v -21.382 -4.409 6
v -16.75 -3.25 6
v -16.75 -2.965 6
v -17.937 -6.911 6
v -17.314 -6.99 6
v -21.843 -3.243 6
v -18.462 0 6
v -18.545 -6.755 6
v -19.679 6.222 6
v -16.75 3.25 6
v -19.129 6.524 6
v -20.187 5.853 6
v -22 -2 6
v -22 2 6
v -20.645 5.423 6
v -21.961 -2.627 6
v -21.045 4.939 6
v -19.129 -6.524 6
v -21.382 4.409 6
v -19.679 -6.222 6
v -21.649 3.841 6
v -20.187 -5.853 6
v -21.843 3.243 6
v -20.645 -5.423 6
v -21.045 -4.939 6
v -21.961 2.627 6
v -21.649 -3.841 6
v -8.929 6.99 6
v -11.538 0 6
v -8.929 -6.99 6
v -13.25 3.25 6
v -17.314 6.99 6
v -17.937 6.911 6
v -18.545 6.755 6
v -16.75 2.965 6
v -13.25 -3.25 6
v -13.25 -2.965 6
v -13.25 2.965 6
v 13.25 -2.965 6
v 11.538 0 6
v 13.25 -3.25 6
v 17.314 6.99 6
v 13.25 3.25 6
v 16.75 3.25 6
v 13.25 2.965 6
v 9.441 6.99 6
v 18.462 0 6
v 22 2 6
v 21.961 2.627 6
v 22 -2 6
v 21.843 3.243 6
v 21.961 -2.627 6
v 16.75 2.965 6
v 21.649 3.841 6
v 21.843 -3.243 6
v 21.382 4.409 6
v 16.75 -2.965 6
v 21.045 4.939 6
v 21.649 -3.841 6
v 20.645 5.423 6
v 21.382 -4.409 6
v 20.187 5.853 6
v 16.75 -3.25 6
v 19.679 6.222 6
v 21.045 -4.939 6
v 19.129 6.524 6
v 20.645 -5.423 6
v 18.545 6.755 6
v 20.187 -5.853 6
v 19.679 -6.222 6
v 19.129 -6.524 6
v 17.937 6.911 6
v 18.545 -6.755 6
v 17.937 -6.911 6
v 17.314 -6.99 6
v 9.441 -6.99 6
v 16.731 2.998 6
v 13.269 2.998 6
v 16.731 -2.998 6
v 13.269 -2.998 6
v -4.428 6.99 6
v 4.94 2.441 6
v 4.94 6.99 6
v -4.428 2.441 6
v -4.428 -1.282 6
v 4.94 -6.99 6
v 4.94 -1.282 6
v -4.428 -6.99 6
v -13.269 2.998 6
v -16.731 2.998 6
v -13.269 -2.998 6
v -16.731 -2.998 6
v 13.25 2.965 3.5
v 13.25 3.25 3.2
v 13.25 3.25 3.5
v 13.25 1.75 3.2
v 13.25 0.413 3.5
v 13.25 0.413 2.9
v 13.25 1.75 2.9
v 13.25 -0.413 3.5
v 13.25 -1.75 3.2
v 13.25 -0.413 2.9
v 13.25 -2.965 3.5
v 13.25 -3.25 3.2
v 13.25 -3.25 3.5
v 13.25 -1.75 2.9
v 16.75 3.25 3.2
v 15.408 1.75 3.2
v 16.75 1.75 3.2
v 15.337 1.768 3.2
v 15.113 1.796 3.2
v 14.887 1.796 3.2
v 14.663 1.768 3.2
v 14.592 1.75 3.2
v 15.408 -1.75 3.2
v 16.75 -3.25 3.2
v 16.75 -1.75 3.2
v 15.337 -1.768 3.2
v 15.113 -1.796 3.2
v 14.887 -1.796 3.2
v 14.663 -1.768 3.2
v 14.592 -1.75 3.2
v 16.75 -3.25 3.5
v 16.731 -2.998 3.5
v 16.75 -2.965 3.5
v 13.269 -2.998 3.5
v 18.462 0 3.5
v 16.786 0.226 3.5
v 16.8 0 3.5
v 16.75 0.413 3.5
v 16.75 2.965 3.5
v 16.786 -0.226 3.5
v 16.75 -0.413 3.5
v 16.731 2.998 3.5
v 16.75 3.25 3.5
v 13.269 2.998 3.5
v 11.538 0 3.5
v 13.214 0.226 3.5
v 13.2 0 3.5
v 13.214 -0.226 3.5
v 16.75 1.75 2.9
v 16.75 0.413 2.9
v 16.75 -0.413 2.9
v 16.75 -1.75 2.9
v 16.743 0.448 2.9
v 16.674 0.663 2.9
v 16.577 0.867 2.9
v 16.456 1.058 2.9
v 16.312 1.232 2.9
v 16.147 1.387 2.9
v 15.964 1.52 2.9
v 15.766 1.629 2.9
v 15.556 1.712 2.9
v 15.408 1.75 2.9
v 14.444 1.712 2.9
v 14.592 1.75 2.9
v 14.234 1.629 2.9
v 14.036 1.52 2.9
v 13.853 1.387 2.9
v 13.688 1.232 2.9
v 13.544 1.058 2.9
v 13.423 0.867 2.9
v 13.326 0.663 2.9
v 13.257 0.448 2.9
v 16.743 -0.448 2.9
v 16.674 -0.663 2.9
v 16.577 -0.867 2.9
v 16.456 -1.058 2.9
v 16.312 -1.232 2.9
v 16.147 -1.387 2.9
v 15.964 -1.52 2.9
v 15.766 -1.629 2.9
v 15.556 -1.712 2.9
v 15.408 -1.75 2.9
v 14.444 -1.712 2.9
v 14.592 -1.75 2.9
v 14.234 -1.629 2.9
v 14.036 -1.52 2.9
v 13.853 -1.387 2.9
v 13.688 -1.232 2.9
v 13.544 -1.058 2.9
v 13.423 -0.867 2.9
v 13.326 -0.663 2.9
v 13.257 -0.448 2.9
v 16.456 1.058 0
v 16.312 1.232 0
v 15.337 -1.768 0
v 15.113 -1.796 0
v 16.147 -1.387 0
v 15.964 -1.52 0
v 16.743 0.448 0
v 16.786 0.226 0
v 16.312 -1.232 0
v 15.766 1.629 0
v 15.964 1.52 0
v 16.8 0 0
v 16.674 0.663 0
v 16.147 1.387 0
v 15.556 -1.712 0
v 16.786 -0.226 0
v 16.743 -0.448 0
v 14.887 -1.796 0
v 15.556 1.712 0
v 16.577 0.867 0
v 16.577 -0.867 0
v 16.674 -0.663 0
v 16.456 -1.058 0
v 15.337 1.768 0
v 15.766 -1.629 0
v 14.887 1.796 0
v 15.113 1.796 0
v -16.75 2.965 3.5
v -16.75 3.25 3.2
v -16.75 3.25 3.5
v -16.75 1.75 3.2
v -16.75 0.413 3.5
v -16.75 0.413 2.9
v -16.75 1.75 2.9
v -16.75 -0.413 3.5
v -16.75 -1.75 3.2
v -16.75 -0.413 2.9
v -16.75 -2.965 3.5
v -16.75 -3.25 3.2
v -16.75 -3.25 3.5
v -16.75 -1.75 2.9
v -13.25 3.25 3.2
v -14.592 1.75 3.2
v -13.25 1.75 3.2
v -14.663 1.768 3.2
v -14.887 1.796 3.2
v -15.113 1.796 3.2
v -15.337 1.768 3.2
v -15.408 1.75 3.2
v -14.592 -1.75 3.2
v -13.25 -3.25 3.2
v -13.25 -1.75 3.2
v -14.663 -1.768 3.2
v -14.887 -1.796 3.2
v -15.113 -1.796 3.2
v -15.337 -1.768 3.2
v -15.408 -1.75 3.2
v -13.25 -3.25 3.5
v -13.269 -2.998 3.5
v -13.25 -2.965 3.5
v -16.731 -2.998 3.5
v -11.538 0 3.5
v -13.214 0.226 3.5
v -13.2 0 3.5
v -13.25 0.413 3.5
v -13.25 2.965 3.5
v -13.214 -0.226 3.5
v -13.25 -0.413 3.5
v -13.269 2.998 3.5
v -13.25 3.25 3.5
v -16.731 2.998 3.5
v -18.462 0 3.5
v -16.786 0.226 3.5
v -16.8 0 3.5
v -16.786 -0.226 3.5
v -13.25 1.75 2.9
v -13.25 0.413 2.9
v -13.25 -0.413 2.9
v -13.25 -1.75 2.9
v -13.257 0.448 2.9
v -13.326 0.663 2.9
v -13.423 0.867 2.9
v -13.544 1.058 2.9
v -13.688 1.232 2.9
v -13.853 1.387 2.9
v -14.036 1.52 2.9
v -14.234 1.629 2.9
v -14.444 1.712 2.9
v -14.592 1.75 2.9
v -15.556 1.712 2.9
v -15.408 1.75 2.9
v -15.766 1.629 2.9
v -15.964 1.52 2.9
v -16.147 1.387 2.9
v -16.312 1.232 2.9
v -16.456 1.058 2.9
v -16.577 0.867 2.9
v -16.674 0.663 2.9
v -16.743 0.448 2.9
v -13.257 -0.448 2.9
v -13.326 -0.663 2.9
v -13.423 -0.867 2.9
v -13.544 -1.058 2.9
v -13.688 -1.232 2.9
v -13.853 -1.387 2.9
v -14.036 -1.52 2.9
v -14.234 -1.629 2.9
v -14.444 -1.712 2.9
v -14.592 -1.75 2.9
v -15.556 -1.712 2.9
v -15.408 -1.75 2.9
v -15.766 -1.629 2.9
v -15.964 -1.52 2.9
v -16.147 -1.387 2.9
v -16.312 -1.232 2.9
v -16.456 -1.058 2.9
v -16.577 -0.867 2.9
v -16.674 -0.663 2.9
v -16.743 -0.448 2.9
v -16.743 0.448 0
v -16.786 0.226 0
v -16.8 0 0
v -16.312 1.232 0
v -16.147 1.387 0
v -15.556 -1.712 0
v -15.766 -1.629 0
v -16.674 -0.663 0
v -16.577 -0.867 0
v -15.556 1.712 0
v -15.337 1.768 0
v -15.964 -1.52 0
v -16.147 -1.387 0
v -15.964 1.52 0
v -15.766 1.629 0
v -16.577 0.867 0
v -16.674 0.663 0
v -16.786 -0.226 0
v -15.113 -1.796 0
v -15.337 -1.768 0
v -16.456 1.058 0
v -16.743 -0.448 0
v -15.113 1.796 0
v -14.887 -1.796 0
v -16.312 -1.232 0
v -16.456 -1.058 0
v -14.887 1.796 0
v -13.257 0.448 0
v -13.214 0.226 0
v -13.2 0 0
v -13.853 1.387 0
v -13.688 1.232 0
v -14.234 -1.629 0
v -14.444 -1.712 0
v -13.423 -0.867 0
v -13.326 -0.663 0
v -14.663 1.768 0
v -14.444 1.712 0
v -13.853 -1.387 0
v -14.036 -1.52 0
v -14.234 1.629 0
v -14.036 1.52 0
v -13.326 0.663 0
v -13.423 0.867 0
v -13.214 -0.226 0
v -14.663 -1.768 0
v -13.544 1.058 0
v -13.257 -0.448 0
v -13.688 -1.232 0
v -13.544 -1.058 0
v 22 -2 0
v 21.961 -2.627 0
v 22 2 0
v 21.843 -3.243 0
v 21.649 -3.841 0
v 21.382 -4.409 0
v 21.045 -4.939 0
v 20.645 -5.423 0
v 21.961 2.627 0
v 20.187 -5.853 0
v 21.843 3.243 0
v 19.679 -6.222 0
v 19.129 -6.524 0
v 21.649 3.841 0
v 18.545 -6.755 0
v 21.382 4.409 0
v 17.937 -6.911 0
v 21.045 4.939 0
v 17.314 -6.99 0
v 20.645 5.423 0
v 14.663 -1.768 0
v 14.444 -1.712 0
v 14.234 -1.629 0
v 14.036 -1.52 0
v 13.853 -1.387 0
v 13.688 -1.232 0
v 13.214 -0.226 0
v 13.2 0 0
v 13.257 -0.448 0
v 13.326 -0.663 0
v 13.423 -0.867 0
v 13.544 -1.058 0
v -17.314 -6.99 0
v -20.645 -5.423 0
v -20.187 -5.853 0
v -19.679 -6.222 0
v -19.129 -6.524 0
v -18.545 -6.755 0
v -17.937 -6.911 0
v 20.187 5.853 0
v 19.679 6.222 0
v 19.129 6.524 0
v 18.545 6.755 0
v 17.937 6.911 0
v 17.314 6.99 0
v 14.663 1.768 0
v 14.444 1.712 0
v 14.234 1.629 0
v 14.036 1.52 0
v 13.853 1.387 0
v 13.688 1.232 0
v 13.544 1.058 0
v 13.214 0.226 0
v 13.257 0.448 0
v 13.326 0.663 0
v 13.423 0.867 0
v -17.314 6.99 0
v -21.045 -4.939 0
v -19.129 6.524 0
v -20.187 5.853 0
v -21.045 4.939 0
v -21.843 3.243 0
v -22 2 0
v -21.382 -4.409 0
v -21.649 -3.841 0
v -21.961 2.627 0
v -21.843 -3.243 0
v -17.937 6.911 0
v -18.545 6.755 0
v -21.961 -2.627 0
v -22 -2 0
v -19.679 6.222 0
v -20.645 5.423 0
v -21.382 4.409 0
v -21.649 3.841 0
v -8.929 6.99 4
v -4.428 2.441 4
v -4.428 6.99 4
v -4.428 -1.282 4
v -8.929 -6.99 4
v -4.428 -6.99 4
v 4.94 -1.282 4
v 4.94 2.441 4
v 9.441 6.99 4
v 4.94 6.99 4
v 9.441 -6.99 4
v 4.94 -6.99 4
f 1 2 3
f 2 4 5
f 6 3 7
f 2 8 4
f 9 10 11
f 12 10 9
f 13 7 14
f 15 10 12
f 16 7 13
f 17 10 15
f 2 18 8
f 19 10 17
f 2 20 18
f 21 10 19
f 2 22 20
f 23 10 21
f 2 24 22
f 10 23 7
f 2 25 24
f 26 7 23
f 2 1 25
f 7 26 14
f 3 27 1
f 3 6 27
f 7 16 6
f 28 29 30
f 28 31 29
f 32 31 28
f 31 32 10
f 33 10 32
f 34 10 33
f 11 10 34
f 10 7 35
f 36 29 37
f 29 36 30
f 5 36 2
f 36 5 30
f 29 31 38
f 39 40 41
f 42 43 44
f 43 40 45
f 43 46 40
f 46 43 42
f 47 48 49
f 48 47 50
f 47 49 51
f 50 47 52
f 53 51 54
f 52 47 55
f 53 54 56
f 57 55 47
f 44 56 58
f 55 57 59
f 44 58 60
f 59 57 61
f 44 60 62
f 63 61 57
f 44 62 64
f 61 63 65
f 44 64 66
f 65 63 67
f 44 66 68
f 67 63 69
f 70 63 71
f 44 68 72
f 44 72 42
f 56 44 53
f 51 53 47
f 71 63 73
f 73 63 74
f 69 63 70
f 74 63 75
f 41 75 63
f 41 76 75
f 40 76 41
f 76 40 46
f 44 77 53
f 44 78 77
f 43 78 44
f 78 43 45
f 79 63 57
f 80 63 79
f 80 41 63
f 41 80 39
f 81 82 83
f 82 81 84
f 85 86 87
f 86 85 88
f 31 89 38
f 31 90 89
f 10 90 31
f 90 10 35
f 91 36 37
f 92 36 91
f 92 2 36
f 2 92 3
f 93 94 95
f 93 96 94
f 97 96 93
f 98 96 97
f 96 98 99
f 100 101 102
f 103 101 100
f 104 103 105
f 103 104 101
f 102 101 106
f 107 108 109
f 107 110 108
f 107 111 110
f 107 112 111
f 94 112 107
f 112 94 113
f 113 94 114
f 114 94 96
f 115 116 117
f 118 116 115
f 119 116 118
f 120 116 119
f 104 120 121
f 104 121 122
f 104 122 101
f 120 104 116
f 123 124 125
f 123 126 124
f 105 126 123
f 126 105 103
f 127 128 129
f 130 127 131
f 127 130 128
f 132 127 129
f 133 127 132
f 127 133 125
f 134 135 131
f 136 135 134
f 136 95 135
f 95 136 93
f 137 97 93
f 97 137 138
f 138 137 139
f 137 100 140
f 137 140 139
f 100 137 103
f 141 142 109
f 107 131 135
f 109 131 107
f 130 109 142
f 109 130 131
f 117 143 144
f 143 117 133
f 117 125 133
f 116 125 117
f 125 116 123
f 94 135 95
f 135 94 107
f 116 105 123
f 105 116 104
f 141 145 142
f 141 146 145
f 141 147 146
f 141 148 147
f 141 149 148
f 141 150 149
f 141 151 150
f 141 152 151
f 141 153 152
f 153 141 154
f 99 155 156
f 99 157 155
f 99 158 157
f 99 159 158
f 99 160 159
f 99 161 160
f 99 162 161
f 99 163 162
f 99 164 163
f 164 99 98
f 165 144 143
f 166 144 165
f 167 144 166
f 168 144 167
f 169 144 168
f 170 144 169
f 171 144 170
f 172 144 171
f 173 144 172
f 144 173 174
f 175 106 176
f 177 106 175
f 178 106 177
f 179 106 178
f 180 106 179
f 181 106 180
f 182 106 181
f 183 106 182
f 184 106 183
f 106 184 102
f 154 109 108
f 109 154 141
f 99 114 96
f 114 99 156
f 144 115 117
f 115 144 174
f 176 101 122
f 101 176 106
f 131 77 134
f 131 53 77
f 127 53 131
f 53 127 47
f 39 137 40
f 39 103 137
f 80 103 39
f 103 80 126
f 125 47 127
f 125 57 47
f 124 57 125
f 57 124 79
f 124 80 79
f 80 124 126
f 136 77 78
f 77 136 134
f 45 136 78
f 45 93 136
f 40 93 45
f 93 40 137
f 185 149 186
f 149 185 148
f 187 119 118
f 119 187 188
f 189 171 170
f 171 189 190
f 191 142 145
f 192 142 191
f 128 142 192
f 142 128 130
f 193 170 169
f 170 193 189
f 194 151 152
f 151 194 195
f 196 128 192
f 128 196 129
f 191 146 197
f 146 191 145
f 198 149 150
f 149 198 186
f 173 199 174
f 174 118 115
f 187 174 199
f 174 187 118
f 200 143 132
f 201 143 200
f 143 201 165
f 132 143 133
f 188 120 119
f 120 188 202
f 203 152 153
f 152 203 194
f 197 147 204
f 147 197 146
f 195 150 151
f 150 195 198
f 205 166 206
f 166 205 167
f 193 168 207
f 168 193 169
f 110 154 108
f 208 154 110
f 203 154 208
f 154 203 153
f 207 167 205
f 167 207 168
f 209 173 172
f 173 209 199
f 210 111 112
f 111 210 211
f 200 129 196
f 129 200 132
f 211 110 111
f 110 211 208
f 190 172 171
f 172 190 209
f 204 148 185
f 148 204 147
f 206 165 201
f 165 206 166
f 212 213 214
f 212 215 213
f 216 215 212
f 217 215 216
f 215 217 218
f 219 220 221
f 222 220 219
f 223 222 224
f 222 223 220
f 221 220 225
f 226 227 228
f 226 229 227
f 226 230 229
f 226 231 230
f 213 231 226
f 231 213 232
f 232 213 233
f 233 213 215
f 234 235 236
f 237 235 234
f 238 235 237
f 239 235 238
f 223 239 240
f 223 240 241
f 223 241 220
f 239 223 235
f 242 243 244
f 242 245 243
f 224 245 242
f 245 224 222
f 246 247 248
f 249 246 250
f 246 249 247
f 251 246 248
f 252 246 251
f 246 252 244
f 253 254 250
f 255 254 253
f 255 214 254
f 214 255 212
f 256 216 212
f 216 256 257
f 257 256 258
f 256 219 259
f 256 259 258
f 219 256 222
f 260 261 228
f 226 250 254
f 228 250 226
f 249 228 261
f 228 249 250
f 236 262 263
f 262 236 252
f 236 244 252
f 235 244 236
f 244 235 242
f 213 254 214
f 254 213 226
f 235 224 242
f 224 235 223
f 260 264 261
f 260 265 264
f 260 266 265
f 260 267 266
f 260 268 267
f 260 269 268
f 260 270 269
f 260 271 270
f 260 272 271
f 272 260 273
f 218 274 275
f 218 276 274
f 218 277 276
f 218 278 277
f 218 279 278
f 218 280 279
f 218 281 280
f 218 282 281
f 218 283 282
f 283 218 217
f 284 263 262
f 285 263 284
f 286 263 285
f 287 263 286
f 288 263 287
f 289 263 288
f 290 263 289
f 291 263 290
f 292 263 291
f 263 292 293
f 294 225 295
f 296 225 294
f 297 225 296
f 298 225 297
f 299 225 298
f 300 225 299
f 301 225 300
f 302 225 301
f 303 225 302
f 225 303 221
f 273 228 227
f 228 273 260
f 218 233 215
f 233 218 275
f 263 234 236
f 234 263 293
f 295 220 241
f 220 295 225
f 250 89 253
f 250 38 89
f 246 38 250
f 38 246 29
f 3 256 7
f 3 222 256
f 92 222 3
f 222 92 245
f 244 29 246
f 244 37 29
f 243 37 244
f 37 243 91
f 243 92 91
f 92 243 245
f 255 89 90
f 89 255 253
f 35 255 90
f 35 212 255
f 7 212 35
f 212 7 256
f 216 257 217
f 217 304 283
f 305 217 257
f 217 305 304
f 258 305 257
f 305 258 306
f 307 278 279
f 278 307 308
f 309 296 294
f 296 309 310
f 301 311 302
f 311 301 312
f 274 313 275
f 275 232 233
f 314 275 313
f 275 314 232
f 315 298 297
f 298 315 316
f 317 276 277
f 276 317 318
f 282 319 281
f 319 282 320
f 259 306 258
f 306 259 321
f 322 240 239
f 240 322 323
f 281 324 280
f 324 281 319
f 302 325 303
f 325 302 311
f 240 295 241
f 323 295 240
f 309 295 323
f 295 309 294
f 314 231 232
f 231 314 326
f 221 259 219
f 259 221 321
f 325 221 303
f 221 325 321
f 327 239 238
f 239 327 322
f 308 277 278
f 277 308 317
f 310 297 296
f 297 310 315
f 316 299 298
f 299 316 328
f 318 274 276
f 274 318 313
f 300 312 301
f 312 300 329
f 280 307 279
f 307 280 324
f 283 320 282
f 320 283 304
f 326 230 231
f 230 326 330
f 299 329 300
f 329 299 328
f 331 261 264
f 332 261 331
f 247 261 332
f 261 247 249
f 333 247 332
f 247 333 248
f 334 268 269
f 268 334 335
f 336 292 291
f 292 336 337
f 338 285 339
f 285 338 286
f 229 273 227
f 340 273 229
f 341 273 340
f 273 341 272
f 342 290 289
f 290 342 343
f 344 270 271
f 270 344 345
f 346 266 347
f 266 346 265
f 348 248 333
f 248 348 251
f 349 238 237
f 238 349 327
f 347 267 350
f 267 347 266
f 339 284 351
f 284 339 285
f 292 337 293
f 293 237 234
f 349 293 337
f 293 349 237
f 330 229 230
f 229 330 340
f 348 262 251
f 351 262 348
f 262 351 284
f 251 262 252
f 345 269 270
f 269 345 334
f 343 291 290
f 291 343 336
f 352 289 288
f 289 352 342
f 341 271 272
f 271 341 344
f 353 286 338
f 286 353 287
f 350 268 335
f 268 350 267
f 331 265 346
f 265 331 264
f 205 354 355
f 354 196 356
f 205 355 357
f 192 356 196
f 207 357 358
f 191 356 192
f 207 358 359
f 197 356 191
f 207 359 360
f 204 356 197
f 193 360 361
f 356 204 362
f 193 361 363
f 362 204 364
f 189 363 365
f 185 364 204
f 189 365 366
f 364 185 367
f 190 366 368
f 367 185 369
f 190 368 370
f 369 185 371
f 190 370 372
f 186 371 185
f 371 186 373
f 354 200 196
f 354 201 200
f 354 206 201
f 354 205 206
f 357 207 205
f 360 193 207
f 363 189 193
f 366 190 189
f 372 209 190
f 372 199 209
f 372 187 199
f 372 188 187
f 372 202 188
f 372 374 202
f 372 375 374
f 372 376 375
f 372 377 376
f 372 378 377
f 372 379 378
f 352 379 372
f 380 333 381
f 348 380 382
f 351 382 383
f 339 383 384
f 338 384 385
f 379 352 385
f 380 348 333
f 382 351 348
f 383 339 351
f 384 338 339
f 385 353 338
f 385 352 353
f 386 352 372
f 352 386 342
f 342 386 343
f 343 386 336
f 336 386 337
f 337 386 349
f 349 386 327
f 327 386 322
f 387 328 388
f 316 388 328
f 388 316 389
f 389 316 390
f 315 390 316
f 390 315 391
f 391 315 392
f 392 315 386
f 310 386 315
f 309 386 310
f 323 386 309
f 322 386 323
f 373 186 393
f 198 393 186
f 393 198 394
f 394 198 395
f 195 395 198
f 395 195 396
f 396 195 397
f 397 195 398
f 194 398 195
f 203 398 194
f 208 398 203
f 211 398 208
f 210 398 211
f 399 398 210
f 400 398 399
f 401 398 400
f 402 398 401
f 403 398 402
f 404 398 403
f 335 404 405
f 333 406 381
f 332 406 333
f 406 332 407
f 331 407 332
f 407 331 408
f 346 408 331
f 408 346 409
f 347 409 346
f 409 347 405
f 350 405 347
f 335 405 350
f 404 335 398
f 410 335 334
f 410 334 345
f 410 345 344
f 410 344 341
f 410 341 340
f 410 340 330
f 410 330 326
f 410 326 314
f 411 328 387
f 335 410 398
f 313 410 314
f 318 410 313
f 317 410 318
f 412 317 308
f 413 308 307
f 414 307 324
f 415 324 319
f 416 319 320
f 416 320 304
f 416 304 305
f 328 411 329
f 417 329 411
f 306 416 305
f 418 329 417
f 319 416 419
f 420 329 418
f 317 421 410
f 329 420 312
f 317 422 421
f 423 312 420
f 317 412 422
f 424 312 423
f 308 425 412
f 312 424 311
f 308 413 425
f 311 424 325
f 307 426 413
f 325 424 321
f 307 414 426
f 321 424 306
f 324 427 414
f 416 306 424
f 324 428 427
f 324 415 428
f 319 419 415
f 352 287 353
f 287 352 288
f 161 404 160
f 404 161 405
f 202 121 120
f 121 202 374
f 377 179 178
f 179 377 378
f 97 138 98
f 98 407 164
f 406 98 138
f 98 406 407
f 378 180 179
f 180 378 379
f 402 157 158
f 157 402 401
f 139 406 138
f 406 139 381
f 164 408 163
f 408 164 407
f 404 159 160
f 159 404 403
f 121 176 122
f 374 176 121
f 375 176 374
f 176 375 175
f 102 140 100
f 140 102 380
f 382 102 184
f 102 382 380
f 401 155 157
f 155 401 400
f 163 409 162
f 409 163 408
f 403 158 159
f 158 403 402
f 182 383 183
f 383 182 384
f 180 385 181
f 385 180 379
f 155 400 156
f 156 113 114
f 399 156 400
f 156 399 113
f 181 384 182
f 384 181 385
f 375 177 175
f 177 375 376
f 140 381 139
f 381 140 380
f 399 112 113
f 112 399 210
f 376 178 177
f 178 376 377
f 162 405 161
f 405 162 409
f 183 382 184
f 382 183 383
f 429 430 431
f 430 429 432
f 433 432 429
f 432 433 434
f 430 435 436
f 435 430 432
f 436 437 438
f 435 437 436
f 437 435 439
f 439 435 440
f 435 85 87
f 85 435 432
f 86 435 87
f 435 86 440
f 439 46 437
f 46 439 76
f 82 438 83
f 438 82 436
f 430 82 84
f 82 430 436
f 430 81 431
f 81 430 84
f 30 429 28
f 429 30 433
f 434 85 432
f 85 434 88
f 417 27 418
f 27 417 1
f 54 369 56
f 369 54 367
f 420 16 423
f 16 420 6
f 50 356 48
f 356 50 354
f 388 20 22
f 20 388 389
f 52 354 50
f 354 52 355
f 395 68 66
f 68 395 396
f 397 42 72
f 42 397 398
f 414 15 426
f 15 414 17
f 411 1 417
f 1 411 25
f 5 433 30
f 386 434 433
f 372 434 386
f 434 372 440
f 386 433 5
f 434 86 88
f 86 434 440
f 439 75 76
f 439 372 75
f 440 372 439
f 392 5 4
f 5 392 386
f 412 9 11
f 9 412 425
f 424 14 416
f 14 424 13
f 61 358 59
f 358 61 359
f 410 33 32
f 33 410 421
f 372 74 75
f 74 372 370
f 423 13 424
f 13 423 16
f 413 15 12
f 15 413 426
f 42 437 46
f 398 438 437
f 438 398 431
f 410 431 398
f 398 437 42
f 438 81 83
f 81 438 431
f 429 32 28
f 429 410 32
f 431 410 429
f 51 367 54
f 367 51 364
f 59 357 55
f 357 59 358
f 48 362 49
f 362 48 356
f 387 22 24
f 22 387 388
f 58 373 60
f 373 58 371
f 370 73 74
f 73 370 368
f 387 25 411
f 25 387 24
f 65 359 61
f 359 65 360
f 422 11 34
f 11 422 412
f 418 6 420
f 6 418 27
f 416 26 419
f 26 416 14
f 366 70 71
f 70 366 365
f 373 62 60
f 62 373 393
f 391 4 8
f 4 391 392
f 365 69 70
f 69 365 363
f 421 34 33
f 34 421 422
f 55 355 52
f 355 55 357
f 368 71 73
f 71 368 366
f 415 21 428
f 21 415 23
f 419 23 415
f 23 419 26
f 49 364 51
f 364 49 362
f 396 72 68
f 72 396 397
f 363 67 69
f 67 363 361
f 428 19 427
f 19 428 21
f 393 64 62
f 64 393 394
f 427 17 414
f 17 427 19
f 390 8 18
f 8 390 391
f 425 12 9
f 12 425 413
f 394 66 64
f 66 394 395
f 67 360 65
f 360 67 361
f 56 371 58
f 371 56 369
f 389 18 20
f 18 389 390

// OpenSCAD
$fn = 50;


difference() {
	union() {
		hull() {
			translate(v = [-17.0000000000, 2.0000000000, 0]) {
				cylinder(h = 6, r = 5);
			}
			translate(v = [17.0000000000, 2.0000000000, 0]) {
				cylinder(h = 6, r = 5);
			}
			translate(v = [-17.0000000000, -2.0000000000, 0]) {
				cylinder(h = 6, r = 5);
			}
			translate(v = [17.0000000000, -2.0000000000, 0]) {
				cylinder(h = 6, r = 5);
			}
		}
	}
	union() {
		translate(v = [15.0000000000, 0, -20]) {
			rotate(a = [0, 180, 0]) {
				difference() {
					union() {
						translate(v = [0, 0, -26.0000000000]) {
							rotate(a = [0, 0, 0]) {
								difference() {
									union() {
										#translate(v = [-1.7500000000, -3.2500000000, -0.3000000000]) {
											cube(size = [3.5000000000, 6.5000000000, 0.3000000000]);
										}
										#translate(v = [-1.7500000000, -1.7500000000, -0.6000000000]) {
											cube(size = [3.5000000000, 3.5000000000, 0.3000000000]);
										}
										#translate(v = [-1.7500000000, -3.2500000000, 2.5000000000]) {
											cube(size = [3.5000000000, 6.5000000000, 0.3000000000]);
										}
										#translate(v = [-1.7500000000, -1.7500000000, 2.8000000000]) {
											cube(size = [3.5000000000, 3.5000000000, 0.3000000000]);
										}
										#linear_extrude(height = 2.5000000000) {
											polygon(points = [[3.4620000000, 0.0000000000], [1.7310000000, 2.9981799479], [-1.7310000000, 2.9981799479], [-3.4620000000, 0.0000000000], [-1.7310000000, -2.9981799479], [1.7310000000, -2.9981799479]]);
										}
										#translate(v = [-1.7500000000, -3.2500000000, -0.3000000000]) {
											cube(size = [3.5000000000, 6.5000000000, 0.3000000000]);
										}
										#translate(v = [-1.7500000000, -1.7500000000, -0.6000000000]) {
											cube(size = [3.5000000000, 3.5000000000, 0.3000000000]);
										}
										#translate(v = [-1.7500000000, -3.2500000000, 2.5000000000]) {
											cube(size = [3.5000000000, 6.5000000000, 0.3000000000]);
										}
										#translate(v = [-1.7500000000, -1.7500000000, 2.8000000000]) {
											cube(size = [3.5000000000, 3.5000000000, 0.3000000000]);
										}
										#translate(v = [-1.7500000000, -3.2500000000, -0.3000000000]) {
											cube(size = [3.5000000000, 6.5000000000, 0.3000000000]);
										}
										#translate(v = [-1.7500000000, -1.7500000000, -0.6000000000]) {
											cube(size = [3.5000000000, 3.5000000000, 0.3000000000]);
										}
										#translate(v = [-1.7500000000, -3.2500000000, 2.5000000000]) {
											cube(size = [3.5000000000, 6.5000000000, 0.3000000000]);
										}
										#translate(v = [-1.7500000000, -1.7500000000, 2.8000000000]) {
											cube(size = [3.5000000000, 3.5000000000, 0.3000000000]);
										}
									}
									union();
								}
							}
						}
						translate(v = [0, 0, -26.0000000000]) {
							rotate(a = [0, 0, 0]) {
								difference() {
									union() {
										#translate(v = [-1.7500000000, -3.2500000000, -0.3000000000]) {
											cube(size = [3.5000000000, 6.5000000000, 0.3000000000]);
										}
										#translate(v = [-1.7500000000, -1.7500000000, -0.6000000000]) {
											cube(size = [3.5000000000, 3.5000000000, 0.3000000000]);
										}
										#translate(v = [-1.7500000000, -3.2500000000, 2.5000000000]) {
											cube(size = [3.5000000000, 6.5000000000, 0.3000000000]);
										}
										#translate(v = [-1.7500000000, -1.7500000000, 2.8000000000]) {
											cube(size = [3.5000000000, 3.5000000000, 0.3000000000]);
										}
										#linear_extrude(height = 2.5000000000) {
											polygon(points = [[3.4620000000, 0.0000000000], [1.7310000000, 2.9981799479], [-1.7310000000, 2.9981799479], [-3.4620000000, 0.0000000000], [-1.7310000000, -2.9981799479], [1.7310000000, -2.9981799479]]);
										}
										#translate(v = [-1.7500000000, -3.2500000000, -0.3000000000]) {
											cube(size = [3.5000000000, 6.5000000000, 0.3000000000]);
										}
										#translate(v = [-1.7500000000, -1.7500000000, -0.6000000000]) {
											cube(size = [3.5000000000, 3.5000000000, 0.3000000000]);
										}
										#translate(v = [-1.7500000000, -3.2500000000, 2.5000000000]) {
											cube(size = [3.5000000000, 6.5000000000, 0.3000000000]);
										}
										#translate(v = [-1.7500000000, -1.7500000000, 2.8000000000]) {
											cube(size = [3.5000000000, 3.5000000000, 0.3000000000]);
										}
										#translate(v = [-1.7500000000, -3.2500000000, -0.3000000000]) {
											cube(size = [3.5000000000, 6.5000000000, 0.3000000000]);
										}
										#translate(v = [-1.7500000000, -1.7500000000, -0.6000000000]) {
											cube(size = [3.5000000000, 3.5000000000, 0.3000000000]);
										}
										#translate(v = [-1.7500000000, -3.2500000000, 2.5000000000]) {
											cube(size = [3.5000000000, 6.5000000000, 0.3000000000]);
										}
										#translate(v = [-1.7500000000, -1.7500000000, 2.8000000000]) {
											cube(size = [3.5000000000, 3.5000000000, 0.3000000000]);
										}
									}
									union();
								}
							}
						}
						translate(v = [0, 0, -26.0000000000]) {
							rotate(a = [0, 0, 0]) {
								difference() {
									union() {
										#translate(v = [-1.7500000000, -3.2500000000, -0.3000000000]) {
											cube(size = [3.5000000000, 6.5000000000, 0.3000000000]);
										}
										#translate(v = [-1.7500000000, -1.7500000000, -0.6000000000]) {
											cube(size = [3.5000000000, 3.5000000000, 0.3000000000]);
										}
										#translate(v = [-1.7500000000, -3.2500000000, 2.5000000000]) {
											cube(size = [3.5000000000, 6.5000000000, 0.3000000000]);
										}
										#translate(v = [-1.7500000000, -1.7500000000, 2.8000000000]) {
											cube(size = [3.5000000000, 3.5000000000, 0.3000000000]);
										}
										#linear_extrude(height = 2.5000000000) {
											polygon(points = [[3.4620000000, 0.0000000000], [1.7310000000, 2.9981799479], [-1.7310000000, 2.9981799479], [-3.4620000000, 0.0000000000], [-1.7310000000, -2.9981799479], [1.7310000000, -2.9981799479]]);
										}
										#translate(v = [-1.7500000000, -3.2500000000, -0.3000000000]) {
											cube(size = [3.5000000000, 6.5000000000, 0.3000000000]);
										}
										#translate(v = [-1.7500000000, -1.7500000000, -0.6000000000]) {
											cube(size = [3.5000000000, 3.5000000000, 0.3000000000]);
										}
										#translate(v = [-1.7500000000, -3.2500000000, 2.5000000000]) {
											cube(size = [3.5000000000, 6.5000000000, 0.3000000000]);
										}
										#translate(v = [-1.7500000000, -1.7500000000, 2.8000000000]) {
											cube(size = [3.5000000000, 3.5000000000, 0.3000000000]);
										}
										#translate(v = [-1.7500000000, -3.2500000000, -0.3000000000]) {
											cube(size = [3.5000000000, 6.5000000000, 0.3000000000]);
										}
										#translate(v = [-1.7500000000, -1.7500000000, -0.6000000000]) {
											cube(size = [3.5000000000, 3.5000000000, 0.3000000000]);
										}
										#translate(v = [-1.7500000000, -3.2500000000, 2.5000000000]) {
											cube(size = [3.5000000000, 6.5000000000, 0.3000000000]);
										}
										#translate(v = [-1.7500000000, -1.7500000000, 2.8000000000]) {
											cube(size = [3.5000000000, 3.5000000000, 0.3000000000]);
										}
									}
									union();
								}
							}
						}
						#translate(v = [0, 0, -26.0000000000]) {
							cylinder(h = 26, r = 1.5000000000);
						}
						#translate(v = [0, 0, -1.9000000000]) {
							cylinder(h = 1.9000000000, r1 = 1.8000000000, r2 = 3.6000000000);
						}
						#translate(v = [0, 0, -26.0000000000]) {
							cylinder(h = 26, r = 1.8000000000);
						}
						#translate(v = [0, 0, -26.0000000000]) {
							cylinder(h = 26, r = 1.5000000000);
						}
					}
					union();
				}
			}
		}
		translate(v = [-15.0000000000, 0, -20]) {
			rotate(a = [0, 180, 0]) {
				difference() {
					union() {
						translate(v = [0, 0, -26.0000000000]) {
							rotate(a = [0, 0, 0]) {
								difference() {
									union() {
										#translate(v = [-1.7500000000, -3.2500000000, -0.3000000000]) {
											cube(size = [3.5000000000, 6.5000000000, 0.3000000000]);
										}
										#translate(v = [-1.7500000000, -1.7500000000, -0.6000000000]) {
											cube(size = [3.5000000000, 3.5000000000, 0.3000000000]);
										}
										#translate(v = [-1.7500000000, -3.2500000000, 2.5000000000]) {
											cube(size = [3.5000000000, 6.5000000000, 0.3000000000]);
										}
										#translate(v = [-1.7500000000, -1.7500000000, 2.8000000000]) {
											cube(size = [3.5000000000, 3.5000000000, 0.3000000000]);
										}
										#linear_extrude(height = 2.5000000000) {
											polygon(points = [[3.4620000000, 0.0000000000], [1.7310000000, 2.9981799479], [-1.7310000000, 2.9981799479], [-3.4620000000, 0.0000000000], [-1.7310000000, -2.9981799479], [1.7310000000, -2.9981799479]]);
										}
										#translate(v = [-1.7500000000, -3.2500000000, -0.3000000000]) {
											cube(size = [3.5000000000, 6.5000000000, 0.3000000000]);
										}
										#translate(v = [-1.7500000000, -1.7500000000, -0.6000000000]) {
											cube(size = [3.5000000000, 3.5000000000, 0.3000000000]);
										}
										#translate(v = [-1.7500000000, -3.2500000000, 2.5000000000]) {
											cube(size = [3.5000000000, 6.5000000000, 0.3000000000]);
										}
										#translate(v = [-1.7500000000, -1.7500000000, 2.8000000000]) {
											cube(size = [3.5000000000, 3.5000000000, 0.3000000000]);
										}
										#translate(v = [-1.7500000000, -3.2500000000, -0.3000000000]) {
											cube(size = [3.5000000000, 6.5000000000, 0.3000000000]);
										}
										#translate(v = [-1.7500000000, -1.7500000000, -0.6000000000]) {
											cube(size = [3.5000000000, 3.5000000000, 0.3000000000]);
										}
										#translate(v = [-1.7500000000, -3.2500000000, 2.5000000000]) {
											cube(size = [3.5000000000, 6.5000000000, 0.3000000000]);
										}
										#translate(v = [-1.7500000000, -1.7500000000, 2.8000000000]) {
											cube(size = [3.5000000000, 3.5000000000, 0.3000000000]);
										}
									}
									union();
								}
							}
						}
						translate(v = [0, 0, -26.0000000000]) {
							rotate(a = [0, 0, 0]) {
								difference() {
									union() {
										#translate(v = [-1.7500000000, -3.2500000000, -0.3000000000]) {
											cube(size = [3.5000000000, 6.5000000000, 0.3000000000]);
										}
										#translate(v = [-1.7500000000, -1.7500000000, -0.6000000000]) {
											cube(size = [3.5000000000, 3.5000000000, 0.3000000000]);
										}
										#translate(v = [-1.7500000000, -3.2500000000, 2.5000000000]) {
											cube(size = [3.5000000000, 6.5000000000, 0.3000000000]);
										}
										#translate(v = [-1.7500000000, -1.7500000000, 2.8000000000]) {
											cube(size = [3.5000000000, 3.5000000000, 0.3000000000]);
										}
										#linear_extrude(height = 2.5000000000) {
											polygon(points = [[3.4620000000, 0.0000000000], [1.7310000000, 2.9981799479], [-1.7310000000, 2.9981799479], [-3.4620000000, 0.0000000000], [-1.7310000000, -2.9981799479], [1.7310000000, -2.9981799479]]);
										}
										#translate(v = [-1.7500000000, -3.2500000000, -0.3000000000]) {
											cube(size = [3.5000000000, 6.5000000000, 0.3000000000]);
										}
										#translate(v = [-1.7500000000, -1.7500000000, -0.6000000000]) {
											cube(size = [3.5000000000, 3.5000000000, 0.3000000000]);
										}
										#translate(v = [-1.7500000000, -3.2500000000, 2.5000000000]) {
											cube(size = [3.5000000000, 6.5000000000, 0.3000000000]);
										}
										#translate(v = [-1.7500000000, -1.7500000000, 2.8000000000]) {
											cube(size = [3.5000000000, 3.5000000000, 0.3000000000]);
										}
										#translate(v = [-1.7500000000, -3.2500000000, -0.3000000000]) {
											cube(size = [3.5000000000, 6.5000000000, 0.3000000000]);
										}
										#translate(v = [-1.7500000000, -1.7500000000, -0.6000000000]) {
											cube(size = [3.5000000000, 3.5000000000, 0.3000000000]);
										}
										#translate(v = [-1.7500000000, -3.2500000000, 2.5000000000]) {
											cube(size = [3.5000000000, 6.5000000000, 0.3000000000]);
										}
										#translate(v = [-1.7500000000, -1.7500000000, 2.8000000000]) {
											cube(size = [3.5000000000, 3.5000000000, 0.3000000000]);
										}
									}
									union();
								}
							}
						}
						translate(v = [0, 0, -26.0000000000]) {
							rotate(a = [0, 0, 0]) {
								difference() {
									union() {
										#translate(v = [-1.7500000000, -3.2500000000, -0.3000000000]) {
											cube(size = [3.5000000000, 6.5000000000, 0.3000000000]);
										}
										#translate(v = [-1.7500000000, -1.7500000000, -0.6000000000]) {
											cube(size = [3.5000000000, 3.5000000000, 0.3000000000]);
										}
										#translate(v = [-1.7500000000, -3.2500000000, 2.5000000000]) {
											cube(size = [3.5000000000, 6.5000000000, 0.3000000000]);
										}
										#translate(v = [-1.7500000000, -1.7500000000, 2.8000000000]) {
											cube(size = [3.5000000000, 3.5000000000, 0.3000000000]);
										}
										#linear_extrude(height = 2.5000000000) {
											polygon(points = [[3.4620000000, 0.0000000000], [1.7310000000, 2.9981799479], [-1.7310000000, 2.9981799479], [-3.4620000000, 0.0000000000], [-1.7310000000, -2.9981799479], [1.7310000000, -2.9981799479]]);
										}
										#translate(v = [-1.7500000000, -3.2500000000, -0.3000000000]) {
											cube(size = [3.5000000000, 6.5000000000, 0.3000000000]);
										}
										#translate(v = [-1.7500000000, -1.7500000000, -0.6000000000]) {
											cube(size = [3.5000000000, 3.5000000000, 0.3000000000]);
										}
										#translate(v = [-1.7500000000, -3.2500000000, 2.5000000000]) {
											cube(size = [3.5000000000, 6.5000000000, 0.3000000000]);
										}
										#translate(v = [-1.7500000000, -1.7500000000, 2.8000000000]) {
											cube(size = [3.5000000000, 3.5000000000, 0.3000000000]);
										}
										#translate(v = [-1.7500000000, -3.2500000000, -0.3000000000]) {
											cube(size = [3.5000000000, 6.5000000000, 0.3000000000]);
										}
										#translate(v = [-1.7500000000, -1.7500000000, -0.6000000000]) {
											cube(size = [3.5000000000, 3.5000000000, 0.3000000000]);
										}
										#translate(v = [-1.7500000000, -3.2500000000, 2.5000000000]) {
											cube(size = [3.5000000000, 6.5000000000, 0.3000000000]);
										}
										#translate(v = [-1.7500000000, -1.7500000000, 2.8000000000]) {
											cube(size = [3.5000000000, 3.5000000000, 0.3000000000]);
										}
									}
									union();
								}
							}
						}
						#translate(v = [0, 0, -26.0000000000]) {
							cylinder(h = 26, r = 1.5000000000);
						}
						#translate(v = [0, 0, -1.9000000000]) {
							cylinder(h = 1.9000000000, r1 = 1.8000000000, r2 = 3.6000000000);
						}
						#translate(v = [0, 0, -26.0000000000]) {
							cylinder(h = 26, r = 1.8000000000);
						}
						#translate(v = [0, 0, -26.0000000000]) {
							cylinder(h = 26, r = 1.5000000000);
						}
					}
					union();
				}
			}
		}
		translate(v = [-15.0000000000, 0.0000000000, 0]) {
			cylinder(h = 6, r = 1.8000000000);
		}
		translate(v = [15.0000000000, 0.0000000000, 0]) {
			cylinder(h = 6, r = 1.8000000000);
		}
		translate(v = [-15.0000000000, 0.0000000000, 0]) {
			cylinder(h = 6, r = 1.8000000000);
		}
		translate(v = [15.0000000000, 0.0000000000, 0]) {
			cylinder(h = 6, r = 1.8000000000);
		}
		translate(v = [-15.0000000000, 0.0000000000, 0]) {
			cylinder(h = 6, r = 1.8000000000);
		}
		translate(v = [15.0000000000, 0.0000000000, 0]) {
			cylinder(h = 6, r = 1.8000000000);
		}
		translate(v = [-15.0000000000, 0.0000000000, 0]) {
			cylinder(h = 6, r = 1.8000000000);
		}
		translate(v = [15.0000000000, 0.0000000000, 0]) {
			cylinder(h = 6, r = 1.8000000000);
		}
		#translate(v = [0, 0, 4]) {
			linear_extrude(height = 2) {
				text(font = "Arial:Bold", halign = "center", size = 22.5000000000, text = "H", valign = "center");
			}
		}
	}
}
